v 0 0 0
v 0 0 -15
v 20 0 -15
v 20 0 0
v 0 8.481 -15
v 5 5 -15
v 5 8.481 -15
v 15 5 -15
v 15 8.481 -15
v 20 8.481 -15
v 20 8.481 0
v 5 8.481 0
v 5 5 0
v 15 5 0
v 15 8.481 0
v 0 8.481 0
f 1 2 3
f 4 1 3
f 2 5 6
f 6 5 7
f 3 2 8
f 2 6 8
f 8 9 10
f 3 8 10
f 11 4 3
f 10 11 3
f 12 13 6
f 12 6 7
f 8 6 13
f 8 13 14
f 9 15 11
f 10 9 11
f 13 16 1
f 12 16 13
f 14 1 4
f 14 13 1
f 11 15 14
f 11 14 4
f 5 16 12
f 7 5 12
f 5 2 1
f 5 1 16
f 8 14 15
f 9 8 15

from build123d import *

# Parameters (mm, degrees)
SKETCH1_W           = 20
SKETCH1_H           = 15
BOSS_EXTRUDE1_DEPTH = 5
SKETCH3_W           = 5
SKETCH3_H           = 3.480811901
BOSS_EXTRUDE2_DEPTH = 15


with BuildPart() as part:
    # Sketch1 → Boss-Extrude1 (new body)
    with BuildSketch(Plane(origin=(0, 0, 0), x_dir=(1, 0, 0), z_dir=(0, 1, 0))):
        with Locations((10, 7.5)):
            Rectangle(SKETCH1_W, SKETCH1_H)
    extrude(amount=BOSS_EXTRUDE1_DEPTH)

    # Sketch3 → Boss-Extrude2 (add)
    with BuildSketch(Plane.XY):
        with Locations((2.5, 6.740405951)):
            Rectangle(SKETCH3_W, SKETCH3_H)
        with Locations((17.5, 6.740405951)):
            Rectangle(SKETCH3_W, SKETCH3_H)
    extrude(amount=-BOSS_EXTRUDE2_DEPTH)


solid = part.part
